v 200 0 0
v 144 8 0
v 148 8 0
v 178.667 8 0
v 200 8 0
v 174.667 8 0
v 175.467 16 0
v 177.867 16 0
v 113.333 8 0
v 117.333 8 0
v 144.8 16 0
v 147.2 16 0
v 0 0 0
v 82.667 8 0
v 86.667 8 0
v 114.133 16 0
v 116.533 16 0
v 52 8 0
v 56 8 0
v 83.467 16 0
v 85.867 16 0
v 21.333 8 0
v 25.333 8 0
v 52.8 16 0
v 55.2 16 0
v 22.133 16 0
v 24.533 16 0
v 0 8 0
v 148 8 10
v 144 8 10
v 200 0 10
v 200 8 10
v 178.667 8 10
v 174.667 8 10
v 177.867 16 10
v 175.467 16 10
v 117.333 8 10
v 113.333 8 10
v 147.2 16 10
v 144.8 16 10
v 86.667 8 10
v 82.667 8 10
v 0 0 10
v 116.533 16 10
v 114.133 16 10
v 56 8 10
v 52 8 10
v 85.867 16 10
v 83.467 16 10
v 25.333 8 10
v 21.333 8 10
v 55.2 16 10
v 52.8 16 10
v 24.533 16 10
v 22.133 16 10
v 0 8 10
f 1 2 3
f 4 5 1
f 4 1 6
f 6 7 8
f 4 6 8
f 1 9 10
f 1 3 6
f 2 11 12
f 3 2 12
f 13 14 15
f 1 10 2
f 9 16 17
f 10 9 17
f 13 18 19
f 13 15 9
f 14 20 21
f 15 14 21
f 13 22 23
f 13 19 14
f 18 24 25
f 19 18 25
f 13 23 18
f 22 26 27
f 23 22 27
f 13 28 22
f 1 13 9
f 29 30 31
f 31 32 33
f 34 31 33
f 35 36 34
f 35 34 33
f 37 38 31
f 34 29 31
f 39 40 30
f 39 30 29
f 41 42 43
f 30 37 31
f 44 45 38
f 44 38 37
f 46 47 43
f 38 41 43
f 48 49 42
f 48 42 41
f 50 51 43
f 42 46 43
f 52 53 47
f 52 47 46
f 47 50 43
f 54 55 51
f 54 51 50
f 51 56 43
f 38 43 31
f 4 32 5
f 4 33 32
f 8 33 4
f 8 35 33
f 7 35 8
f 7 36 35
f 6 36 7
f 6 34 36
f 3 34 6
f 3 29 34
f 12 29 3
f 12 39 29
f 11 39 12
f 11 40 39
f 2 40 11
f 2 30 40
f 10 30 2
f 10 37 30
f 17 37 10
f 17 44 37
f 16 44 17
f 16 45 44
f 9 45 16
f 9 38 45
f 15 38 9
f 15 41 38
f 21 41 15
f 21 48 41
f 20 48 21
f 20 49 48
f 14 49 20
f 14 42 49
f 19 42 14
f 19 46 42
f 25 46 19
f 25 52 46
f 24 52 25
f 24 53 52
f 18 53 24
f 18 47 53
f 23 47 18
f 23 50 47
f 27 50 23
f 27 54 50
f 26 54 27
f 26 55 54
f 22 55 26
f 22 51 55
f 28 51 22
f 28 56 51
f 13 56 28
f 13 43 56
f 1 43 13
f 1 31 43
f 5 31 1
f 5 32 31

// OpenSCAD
$fn = 32;

// ----------------------------------------------------------------------
// Gear rack: 6 teeth on a 200 mm bar, pitch 30.67 mm
// ----------------------------------------------------------------------

// --- parameters (mm) ---
profile_height = 10;      // extrusion height
profile_points = 28;      // points of the closed outline

profile = [[0, 0], [200, 0], [200, 8], [178.667, 8], [177.867, 16], [175.467, 16], [174.667, 8], [148, 8], [147.2, 16], [144.8, 16], [144, 8], [117.333, 8], [116.533, 16], [114.133, 16], [113.333, 8], [86.667, 8], [85.867, 16], [83.467, 16], [82.667, 8], [56, 8], [55.2, 16], [52.8, 16], [52, 8], [25.333, 8], [24.533, 16], [22.133, 16], [21.333, 8], [0, 8]];  // single closed polygon, 28 points, counter clockwise

// --- the one profile operation ---
linear_extrude(height = profile_height) polygon(points = profile);
